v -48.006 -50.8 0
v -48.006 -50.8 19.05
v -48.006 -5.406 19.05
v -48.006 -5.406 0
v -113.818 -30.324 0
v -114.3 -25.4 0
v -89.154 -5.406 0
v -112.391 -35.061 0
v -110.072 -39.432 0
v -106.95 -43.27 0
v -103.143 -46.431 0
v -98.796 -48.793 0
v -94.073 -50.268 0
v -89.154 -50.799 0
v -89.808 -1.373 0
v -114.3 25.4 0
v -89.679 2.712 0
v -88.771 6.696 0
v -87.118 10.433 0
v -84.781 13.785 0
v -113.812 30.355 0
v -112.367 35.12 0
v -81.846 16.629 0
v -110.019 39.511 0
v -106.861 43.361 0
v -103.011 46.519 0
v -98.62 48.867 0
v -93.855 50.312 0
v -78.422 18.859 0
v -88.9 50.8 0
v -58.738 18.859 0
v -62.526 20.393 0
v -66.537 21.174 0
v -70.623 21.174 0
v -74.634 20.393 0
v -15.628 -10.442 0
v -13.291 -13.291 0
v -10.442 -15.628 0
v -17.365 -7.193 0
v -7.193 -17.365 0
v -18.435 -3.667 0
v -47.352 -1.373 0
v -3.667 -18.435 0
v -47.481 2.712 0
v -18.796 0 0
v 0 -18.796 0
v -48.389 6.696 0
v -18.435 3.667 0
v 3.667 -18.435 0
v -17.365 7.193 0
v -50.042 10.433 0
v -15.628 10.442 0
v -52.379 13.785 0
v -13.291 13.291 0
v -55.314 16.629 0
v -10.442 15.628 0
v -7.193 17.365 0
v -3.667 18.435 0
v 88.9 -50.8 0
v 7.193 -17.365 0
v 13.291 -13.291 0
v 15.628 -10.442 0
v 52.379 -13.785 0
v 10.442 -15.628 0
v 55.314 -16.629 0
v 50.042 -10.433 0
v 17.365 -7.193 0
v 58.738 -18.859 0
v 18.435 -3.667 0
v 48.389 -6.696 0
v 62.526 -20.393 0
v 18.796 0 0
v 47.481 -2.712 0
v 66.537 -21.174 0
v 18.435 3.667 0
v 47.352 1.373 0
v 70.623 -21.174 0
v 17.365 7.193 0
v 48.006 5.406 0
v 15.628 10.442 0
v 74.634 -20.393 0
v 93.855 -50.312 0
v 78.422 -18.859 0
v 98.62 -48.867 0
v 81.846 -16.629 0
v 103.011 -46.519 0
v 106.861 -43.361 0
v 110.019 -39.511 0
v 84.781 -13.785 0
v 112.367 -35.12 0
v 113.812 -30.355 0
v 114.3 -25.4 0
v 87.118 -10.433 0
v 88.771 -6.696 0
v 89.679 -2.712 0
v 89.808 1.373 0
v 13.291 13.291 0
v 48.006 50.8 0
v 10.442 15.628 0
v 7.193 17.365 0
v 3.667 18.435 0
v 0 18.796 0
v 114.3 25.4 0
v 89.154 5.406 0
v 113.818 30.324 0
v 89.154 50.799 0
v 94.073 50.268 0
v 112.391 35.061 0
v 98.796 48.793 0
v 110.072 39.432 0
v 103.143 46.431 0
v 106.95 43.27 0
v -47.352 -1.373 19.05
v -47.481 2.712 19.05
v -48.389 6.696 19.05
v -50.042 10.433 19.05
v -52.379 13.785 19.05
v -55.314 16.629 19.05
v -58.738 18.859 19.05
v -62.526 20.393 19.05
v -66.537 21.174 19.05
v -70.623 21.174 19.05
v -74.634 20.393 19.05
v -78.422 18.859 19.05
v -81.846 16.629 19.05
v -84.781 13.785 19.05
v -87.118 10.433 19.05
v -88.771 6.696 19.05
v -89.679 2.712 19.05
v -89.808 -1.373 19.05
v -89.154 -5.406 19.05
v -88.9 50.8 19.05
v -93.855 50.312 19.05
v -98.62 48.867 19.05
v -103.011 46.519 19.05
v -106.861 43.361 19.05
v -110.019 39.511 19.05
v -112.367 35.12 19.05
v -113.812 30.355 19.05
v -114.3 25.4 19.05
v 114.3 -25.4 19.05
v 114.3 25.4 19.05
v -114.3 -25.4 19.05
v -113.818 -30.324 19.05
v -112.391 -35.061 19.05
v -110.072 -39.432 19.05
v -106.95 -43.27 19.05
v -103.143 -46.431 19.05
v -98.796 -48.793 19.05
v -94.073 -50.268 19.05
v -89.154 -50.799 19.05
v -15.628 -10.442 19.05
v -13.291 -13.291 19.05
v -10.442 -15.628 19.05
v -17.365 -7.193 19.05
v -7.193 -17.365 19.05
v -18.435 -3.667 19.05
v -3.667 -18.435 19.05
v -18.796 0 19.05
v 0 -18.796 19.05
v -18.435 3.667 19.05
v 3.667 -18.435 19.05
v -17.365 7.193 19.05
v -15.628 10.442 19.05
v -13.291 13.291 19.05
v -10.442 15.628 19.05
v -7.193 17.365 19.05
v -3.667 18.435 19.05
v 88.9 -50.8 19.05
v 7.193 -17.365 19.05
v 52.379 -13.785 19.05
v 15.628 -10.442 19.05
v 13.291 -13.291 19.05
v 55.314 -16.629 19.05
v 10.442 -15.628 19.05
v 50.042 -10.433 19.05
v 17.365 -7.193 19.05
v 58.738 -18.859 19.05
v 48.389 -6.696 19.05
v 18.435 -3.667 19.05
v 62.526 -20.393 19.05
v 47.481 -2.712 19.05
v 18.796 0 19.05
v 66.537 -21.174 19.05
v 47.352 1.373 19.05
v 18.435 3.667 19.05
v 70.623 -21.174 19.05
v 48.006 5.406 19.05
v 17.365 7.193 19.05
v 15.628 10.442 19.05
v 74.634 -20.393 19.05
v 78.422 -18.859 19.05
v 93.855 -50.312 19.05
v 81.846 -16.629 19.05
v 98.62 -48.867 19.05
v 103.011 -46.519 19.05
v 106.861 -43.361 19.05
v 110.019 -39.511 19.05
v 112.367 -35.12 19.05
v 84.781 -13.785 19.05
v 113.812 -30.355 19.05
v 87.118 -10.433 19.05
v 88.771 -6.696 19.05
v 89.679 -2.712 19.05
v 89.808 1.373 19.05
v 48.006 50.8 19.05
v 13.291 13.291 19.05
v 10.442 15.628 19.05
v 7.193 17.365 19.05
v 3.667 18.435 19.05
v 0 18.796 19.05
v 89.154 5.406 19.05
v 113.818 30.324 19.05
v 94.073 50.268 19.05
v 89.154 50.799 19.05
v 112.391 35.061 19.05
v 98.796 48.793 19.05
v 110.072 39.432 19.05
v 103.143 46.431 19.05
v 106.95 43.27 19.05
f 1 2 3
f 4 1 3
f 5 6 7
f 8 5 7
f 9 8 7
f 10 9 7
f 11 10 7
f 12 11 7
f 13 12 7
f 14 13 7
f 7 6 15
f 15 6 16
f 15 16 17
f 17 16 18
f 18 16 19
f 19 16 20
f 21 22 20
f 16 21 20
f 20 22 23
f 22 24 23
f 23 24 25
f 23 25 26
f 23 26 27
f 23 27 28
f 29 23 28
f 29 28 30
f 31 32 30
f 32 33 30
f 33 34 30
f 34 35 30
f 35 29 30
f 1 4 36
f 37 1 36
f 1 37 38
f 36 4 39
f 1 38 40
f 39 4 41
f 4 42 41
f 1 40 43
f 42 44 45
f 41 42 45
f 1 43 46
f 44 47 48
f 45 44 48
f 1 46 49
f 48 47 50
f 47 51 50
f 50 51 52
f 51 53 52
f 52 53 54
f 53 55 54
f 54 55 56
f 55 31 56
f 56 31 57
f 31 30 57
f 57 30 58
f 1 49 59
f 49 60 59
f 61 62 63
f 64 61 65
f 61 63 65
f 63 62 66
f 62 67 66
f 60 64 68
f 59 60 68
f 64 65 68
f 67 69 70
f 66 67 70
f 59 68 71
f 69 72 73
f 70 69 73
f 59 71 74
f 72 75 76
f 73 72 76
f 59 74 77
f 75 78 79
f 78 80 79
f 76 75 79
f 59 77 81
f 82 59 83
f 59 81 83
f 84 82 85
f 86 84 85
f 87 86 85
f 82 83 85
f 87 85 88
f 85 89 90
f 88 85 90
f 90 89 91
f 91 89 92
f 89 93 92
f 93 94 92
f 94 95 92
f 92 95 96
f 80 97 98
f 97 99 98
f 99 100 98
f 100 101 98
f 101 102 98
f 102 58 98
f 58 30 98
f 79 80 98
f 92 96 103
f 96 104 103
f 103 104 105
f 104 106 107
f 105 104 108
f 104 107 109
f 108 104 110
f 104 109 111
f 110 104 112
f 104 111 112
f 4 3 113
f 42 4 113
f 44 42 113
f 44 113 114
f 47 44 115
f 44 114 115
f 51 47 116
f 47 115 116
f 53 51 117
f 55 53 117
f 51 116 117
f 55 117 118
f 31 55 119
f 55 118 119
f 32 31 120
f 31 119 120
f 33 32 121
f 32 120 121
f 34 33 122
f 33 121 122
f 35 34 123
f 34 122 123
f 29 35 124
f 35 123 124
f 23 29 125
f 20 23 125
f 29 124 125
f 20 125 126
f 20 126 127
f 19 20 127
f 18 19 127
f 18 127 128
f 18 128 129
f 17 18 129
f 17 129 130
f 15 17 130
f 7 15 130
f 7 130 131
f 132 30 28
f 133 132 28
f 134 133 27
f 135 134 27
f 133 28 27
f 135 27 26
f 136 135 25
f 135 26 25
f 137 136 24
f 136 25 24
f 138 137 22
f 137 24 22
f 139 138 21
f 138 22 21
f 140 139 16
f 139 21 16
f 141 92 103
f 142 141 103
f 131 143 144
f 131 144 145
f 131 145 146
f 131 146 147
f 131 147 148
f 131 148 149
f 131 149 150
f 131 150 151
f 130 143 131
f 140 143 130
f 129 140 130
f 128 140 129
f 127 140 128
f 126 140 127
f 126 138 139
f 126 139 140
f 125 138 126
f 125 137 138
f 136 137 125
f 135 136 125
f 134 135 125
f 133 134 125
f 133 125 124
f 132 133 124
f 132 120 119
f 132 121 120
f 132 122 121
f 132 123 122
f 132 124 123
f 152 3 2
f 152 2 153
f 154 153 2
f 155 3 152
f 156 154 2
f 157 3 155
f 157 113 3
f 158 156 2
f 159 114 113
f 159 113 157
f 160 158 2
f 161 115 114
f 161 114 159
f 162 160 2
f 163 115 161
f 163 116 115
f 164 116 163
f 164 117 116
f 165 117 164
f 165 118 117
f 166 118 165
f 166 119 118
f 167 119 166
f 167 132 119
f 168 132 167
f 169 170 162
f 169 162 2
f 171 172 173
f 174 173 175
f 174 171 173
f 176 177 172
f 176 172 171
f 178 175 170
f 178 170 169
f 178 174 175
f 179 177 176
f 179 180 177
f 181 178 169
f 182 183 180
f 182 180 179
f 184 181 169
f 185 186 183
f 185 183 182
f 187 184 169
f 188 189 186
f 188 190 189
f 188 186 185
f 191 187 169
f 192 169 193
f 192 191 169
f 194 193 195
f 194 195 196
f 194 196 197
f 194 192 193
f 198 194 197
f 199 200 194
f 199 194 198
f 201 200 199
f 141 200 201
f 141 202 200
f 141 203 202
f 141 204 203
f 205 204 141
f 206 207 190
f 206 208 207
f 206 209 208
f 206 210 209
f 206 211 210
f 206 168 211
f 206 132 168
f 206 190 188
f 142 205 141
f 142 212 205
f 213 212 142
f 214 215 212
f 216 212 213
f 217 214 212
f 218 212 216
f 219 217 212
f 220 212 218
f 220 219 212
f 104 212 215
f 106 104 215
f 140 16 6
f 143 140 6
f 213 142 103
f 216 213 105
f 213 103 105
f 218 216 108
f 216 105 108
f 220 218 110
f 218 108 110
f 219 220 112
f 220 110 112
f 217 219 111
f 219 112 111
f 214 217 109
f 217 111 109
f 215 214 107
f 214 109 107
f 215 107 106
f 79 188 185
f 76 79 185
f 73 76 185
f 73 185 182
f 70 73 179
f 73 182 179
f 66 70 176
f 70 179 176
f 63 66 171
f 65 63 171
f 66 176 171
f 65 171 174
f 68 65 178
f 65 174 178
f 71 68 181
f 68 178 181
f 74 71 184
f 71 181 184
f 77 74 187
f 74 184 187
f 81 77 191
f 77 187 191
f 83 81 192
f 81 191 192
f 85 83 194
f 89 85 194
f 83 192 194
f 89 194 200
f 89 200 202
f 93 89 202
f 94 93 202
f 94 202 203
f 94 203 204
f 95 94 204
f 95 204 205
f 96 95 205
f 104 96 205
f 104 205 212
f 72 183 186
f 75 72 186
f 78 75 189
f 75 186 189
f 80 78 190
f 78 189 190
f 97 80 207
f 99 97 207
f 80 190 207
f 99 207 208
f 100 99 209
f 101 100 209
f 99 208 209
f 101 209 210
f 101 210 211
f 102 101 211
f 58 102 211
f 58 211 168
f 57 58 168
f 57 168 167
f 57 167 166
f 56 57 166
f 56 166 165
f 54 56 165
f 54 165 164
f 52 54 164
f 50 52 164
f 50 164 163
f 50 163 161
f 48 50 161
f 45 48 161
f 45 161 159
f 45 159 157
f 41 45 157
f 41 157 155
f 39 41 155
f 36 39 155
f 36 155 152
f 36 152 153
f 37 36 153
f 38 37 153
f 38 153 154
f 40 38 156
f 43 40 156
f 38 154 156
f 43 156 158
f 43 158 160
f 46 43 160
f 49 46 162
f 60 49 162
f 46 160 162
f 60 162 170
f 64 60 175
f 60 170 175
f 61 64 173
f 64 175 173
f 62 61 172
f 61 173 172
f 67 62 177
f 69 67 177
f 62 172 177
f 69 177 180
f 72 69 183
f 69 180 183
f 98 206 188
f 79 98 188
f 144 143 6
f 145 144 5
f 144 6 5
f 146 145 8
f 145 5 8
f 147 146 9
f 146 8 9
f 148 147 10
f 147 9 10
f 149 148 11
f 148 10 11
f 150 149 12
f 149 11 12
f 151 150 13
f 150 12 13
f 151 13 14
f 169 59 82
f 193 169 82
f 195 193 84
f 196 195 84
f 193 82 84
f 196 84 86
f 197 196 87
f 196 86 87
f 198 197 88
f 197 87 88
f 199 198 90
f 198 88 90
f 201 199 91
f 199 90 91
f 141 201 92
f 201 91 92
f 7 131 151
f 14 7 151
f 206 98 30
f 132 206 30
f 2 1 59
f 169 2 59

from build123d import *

# Parameters (mm, degrees)
F1_DEPTH = 19.05
F2_R     = 18.796
F3_DEPTH = 19.051
F5_DEPTH = 19.051


with BuildPart() as f1:
    # F0 (on Top) → F1 (new body)
    with BuildSketch(Plane.XY):
        with BuildLine():
            ThreePointArc((114.3, 25.4), (106.860512, 43.360512), (88.9, 50.8))
            Line((88.9, 50.8), (-88.9, 50.8))
            ThreePointArc((-88.9, 50.8), (-106.860512, 43.360512), (-114.3, 25.4))
            Line((-114.3, 25.4), (-114.3, -25.4))
            ThreePointArc((-114.3, -25.4), (-106.860512, -43.360512), (-88.9, -50.8))
            Line((-88.9, -50.8), (88.9, -50.8))
            ThreePointArc((88.9, -50.8), (106.860512, -43.360512), (114.3, -25.4))
            Line((114.3, -25.4), (114.3, 25.4))
        make_face()
    extrude(amount=F1_DEPTH)

    # F2 (on face) → F3 (cut, through all)
    with BuildSketch(Plane.XY.offset(19.05)):
        Circle(F2_R)
    extrude(amount=-F3_DEPTH, mode=Mode.SUBTRACT)

    # F4 (on face) → F5 (cut, through all)
    with BuildSketch(Plane.XY.offset(19.05)):
        with BuildLine():
            Line((-48.006, -50.8), (-48.006, -5.406457))
            ThreePointArc((-48.006, -5.406457), (-68.58, 21.2725), (-89.154, -5.406457))
            Line((-89.154, -5.406457), (-89.154, -50.8))
            Line((-89.154, -50.8), (-48.006, -50.8))
        make_face()
        with BuildLine():
            ThreePointArc((48.006, 5.406457), (68.58, -21.2725), (89.154, 5.406457))
            Line((89.154, 5.406457), (89.154, 50.8))
            Line((89.154, 50.8), (48.006, 50.8))
            Line((48.006, 50.8), (48.006, 5.406457))
        make_face()
    extrude(amount=-F5_DEPTH, mode=Mode.SUBTRACT)


solid = f1.part
